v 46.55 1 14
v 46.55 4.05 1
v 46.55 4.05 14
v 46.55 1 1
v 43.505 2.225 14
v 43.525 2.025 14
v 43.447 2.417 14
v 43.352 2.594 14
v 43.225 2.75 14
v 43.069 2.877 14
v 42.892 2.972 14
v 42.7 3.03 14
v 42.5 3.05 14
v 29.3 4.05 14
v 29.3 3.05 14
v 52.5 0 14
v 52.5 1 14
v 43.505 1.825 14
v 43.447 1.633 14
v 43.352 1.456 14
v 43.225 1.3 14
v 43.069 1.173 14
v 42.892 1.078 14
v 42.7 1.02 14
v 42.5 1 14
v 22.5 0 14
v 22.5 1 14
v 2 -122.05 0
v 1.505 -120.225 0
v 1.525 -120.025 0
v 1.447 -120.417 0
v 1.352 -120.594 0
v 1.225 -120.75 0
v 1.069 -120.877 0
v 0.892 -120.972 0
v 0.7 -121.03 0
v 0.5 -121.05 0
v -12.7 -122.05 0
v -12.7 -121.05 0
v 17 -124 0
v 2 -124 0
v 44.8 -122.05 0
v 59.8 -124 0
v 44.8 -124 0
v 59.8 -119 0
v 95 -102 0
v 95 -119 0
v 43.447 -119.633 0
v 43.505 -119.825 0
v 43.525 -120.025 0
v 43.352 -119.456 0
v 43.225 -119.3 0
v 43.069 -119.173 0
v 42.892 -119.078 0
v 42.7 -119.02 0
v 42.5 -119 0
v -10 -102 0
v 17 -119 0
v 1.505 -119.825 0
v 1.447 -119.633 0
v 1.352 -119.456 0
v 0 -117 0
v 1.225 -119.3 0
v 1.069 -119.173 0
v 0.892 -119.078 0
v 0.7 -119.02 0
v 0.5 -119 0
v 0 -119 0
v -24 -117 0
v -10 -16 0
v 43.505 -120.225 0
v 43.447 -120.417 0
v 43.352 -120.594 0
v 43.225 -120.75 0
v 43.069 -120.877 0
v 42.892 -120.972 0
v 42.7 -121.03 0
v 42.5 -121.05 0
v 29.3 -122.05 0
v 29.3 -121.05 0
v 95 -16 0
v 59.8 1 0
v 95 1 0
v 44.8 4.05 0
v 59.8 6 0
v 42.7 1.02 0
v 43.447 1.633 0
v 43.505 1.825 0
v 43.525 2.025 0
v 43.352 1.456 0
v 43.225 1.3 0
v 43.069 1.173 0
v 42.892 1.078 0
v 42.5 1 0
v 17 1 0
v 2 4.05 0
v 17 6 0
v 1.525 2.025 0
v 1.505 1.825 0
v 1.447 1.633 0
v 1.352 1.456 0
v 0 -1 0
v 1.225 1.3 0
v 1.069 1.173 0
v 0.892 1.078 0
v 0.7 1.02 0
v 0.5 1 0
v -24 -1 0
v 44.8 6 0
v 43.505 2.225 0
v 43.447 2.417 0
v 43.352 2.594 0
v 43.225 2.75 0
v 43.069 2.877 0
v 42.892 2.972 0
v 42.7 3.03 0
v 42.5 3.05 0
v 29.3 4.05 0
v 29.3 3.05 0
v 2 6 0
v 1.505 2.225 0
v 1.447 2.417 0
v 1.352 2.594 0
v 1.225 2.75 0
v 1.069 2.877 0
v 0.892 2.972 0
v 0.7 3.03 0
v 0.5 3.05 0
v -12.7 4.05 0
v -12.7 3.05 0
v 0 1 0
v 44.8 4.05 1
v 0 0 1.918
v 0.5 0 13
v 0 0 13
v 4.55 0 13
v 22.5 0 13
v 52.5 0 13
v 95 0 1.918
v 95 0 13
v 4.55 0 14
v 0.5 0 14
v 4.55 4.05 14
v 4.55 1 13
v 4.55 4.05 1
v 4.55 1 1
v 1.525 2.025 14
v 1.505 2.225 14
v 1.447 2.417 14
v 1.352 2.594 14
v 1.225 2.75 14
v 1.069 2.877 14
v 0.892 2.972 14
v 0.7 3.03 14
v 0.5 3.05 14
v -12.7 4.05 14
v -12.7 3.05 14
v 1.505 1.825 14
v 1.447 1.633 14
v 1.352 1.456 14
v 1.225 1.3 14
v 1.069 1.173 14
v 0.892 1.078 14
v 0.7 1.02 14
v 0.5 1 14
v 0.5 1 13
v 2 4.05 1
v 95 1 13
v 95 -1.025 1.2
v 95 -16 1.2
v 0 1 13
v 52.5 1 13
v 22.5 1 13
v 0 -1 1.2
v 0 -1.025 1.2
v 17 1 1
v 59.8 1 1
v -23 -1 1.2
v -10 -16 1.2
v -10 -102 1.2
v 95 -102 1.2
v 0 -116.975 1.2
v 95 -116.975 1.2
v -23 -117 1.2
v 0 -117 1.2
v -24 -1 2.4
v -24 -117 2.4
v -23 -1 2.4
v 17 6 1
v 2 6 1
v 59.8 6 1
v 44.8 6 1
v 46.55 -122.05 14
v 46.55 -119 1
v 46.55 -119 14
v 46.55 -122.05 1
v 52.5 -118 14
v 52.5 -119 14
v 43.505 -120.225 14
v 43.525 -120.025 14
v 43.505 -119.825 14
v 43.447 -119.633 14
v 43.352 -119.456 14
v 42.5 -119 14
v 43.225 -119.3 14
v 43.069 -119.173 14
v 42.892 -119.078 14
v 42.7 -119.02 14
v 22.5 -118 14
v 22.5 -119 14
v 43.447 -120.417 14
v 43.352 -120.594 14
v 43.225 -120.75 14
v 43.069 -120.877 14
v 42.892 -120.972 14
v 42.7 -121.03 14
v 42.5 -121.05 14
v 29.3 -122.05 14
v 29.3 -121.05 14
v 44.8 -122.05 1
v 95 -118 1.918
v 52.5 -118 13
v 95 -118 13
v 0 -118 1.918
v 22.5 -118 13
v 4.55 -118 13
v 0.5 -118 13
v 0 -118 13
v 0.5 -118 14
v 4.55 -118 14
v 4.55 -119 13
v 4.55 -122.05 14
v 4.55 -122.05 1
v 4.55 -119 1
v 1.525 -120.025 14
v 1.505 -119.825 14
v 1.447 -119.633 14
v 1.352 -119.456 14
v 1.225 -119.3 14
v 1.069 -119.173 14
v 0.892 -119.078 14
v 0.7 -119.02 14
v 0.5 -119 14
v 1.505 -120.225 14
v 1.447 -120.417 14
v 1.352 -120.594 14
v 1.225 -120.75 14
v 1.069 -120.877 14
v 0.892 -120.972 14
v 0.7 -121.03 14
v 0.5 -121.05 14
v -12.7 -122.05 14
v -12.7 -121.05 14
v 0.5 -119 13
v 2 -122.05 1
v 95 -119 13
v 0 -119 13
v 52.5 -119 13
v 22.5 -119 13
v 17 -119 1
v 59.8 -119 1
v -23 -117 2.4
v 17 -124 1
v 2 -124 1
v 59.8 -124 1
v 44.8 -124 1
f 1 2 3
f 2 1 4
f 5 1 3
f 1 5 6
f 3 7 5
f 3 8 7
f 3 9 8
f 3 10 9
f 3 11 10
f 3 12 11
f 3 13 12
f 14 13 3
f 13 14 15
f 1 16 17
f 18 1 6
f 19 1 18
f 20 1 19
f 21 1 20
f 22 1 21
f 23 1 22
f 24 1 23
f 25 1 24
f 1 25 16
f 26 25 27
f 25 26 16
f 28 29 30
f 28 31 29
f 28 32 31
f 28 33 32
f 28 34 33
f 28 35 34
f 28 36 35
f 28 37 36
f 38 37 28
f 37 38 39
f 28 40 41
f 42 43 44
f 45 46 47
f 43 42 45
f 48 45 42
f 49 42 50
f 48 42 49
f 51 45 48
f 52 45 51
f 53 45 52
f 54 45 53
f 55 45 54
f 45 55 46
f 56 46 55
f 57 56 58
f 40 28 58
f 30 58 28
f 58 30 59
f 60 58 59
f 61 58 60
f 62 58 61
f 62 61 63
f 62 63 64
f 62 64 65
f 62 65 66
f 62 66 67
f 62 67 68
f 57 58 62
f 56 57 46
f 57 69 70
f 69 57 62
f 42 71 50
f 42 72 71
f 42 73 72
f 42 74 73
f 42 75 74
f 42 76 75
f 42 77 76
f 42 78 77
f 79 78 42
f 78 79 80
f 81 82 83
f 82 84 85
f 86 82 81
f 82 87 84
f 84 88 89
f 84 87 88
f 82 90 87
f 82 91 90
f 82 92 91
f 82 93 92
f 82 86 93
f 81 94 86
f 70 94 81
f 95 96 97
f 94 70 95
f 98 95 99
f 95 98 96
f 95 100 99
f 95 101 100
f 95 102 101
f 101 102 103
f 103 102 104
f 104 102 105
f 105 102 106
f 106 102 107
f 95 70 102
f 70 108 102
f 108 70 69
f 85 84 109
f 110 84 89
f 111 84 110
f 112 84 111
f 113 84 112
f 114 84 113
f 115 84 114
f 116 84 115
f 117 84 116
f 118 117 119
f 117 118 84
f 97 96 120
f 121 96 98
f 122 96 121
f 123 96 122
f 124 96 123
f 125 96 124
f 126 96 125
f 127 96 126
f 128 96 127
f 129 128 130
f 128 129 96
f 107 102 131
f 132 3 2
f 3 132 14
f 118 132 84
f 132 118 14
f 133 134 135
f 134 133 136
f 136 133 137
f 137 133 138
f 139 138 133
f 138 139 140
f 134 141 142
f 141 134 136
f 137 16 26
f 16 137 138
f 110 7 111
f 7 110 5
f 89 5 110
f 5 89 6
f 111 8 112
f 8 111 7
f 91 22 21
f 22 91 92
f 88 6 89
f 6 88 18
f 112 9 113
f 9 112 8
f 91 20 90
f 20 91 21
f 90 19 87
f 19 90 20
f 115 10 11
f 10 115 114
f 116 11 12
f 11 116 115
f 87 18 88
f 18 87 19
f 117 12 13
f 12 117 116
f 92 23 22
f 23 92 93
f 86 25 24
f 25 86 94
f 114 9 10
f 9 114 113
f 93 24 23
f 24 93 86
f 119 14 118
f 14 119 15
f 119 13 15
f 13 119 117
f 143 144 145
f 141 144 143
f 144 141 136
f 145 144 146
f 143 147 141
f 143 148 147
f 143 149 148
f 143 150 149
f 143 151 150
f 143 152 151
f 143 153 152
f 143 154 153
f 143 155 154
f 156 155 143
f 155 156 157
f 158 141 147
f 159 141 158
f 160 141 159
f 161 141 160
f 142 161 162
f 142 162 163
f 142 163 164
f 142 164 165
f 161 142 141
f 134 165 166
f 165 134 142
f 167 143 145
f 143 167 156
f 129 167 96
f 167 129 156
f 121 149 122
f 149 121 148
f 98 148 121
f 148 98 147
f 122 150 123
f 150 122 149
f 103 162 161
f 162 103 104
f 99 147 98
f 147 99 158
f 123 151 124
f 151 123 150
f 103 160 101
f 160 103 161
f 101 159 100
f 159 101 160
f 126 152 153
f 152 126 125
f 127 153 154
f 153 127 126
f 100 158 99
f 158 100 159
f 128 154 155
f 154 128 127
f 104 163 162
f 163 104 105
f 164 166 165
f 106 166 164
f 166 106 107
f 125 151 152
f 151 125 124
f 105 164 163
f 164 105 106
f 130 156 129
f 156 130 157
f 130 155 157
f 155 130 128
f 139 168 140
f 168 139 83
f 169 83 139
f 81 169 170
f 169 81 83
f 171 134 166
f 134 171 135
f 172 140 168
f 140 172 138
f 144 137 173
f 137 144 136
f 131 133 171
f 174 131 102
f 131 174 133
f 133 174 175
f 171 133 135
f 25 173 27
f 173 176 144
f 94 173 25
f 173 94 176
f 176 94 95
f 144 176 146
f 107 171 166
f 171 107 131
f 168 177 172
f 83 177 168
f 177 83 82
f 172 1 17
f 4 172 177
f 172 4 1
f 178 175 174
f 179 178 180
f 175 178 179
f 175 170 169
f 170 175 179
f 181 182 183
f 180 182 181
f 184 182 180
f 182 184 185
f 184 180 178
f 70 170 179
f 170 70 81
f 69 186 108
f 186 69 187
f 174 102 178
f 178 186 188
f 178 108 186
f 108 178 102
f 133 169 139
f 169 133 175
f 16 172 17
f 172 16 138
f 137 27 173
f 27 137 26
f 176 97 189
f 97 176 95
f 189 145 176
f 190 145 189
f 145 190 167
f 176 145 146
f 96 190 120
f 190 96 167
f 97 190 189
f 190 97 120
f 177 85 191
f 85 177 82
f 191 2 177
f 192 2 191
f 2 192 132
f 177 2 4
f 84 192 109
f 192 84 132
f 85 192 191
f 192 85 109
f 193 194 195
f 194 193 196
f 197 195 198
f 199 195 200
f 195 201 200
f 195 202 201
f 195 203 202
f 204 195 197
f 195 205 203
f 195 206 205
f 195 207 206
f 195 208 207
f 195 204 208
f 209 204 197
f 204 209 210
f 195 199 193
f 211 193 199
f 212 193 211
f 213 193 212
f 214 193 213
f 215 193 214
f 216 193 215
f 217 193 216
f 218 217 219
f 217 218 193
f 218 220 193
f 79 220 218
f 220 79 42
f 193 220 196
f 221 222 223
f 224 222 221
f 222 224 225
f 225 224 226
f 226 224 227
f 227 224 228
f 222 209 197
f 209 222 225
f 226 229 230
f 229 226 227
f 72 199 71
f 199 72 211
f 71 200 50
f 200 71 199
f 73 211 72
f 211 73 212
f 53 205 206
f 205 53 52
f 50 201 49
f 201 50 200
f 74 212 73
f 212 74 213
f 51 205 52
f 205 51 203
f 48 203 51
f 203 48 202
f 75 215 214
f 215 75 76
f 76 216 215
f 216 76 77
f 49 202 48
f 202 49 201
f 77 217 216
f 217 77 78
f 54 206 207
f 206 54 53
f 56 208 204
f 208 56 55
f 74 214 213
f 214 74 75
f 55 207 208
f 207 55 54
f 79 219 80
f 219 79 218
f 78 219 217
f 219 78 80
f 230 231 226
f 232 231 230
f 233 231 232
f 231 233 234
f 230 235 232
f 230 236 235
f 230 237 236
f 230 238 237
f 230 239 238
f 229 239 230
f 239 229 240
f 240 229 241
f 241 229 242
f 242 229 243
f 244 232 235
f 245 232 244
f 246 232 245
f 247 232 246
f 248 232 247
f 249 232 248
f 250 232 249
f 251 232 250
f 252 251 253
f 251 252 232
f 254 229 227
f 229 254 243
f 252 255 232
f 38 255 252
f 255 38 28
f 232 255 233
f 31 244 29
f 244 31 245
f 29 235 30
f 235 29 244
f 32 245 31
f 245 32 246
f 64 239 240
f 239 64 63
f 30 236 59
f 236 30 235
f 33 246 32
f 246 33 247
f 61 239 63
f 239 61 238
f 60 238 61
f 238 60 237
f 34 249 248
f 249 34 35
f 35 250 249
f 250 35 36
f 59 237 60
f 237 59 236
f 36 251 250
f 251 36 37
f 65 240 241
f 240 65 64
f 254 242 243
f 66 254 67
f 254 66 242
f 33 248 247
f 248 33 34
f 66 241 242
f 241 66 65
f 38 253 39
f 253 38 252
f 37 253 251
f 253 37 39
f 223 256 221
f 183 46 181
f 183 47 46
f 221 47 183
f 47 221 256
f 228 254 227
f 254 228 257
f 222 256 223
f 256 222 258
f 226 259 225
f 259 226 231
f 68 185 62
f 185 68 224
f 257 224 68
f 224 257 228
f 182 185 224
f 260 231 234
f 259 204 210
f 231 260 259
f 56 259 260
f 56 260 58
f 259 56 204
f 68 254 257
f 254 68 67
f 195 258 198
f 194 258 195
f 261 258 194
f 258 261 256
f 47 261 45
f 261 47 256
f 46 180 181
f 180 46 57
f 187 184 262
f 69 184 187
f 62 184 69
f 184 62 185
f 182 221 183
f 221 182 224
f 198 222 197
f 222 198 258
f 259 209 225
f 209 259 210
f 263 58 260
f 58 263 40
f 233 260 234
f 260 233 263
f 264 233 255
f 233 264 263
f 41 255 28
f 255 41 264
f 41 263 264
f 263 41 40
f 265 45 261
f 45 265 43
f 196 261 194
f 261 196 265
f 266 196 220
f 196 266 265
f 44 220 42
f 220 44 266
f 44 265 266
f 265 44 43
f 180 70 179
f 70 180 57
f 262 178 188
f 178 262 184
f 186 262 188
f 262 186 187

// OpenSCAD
  

restde=16;
backde=14;
backiw=118;//back inner width
backxtraraillen=24; // xtra rail length to go to back
restth=1.2;
endnar=1; //mm narrowing in the back area

module rackhook(){
  raillen=75;
  xtraraillen=20;
  railh=13;
  railth=1;


  pegw=11;
  pegth=1.95;//1.8
  flapw=30;
  flaph=14;
  flapth=1;
  hookth=1;
  hookw=pegw*1.2;
  hookgap=pegth+0.1;
  spineth=flapth+hookgap+hookth;
  xofs=-10;


	//rail
	cube([raillen+xtraraillen,railth,railh]);
  //extrarail front
	//rest
	translate([0,-restde,0]) cube([raillen+xtraraillen,restde,restth]);
	translate([-backxtraraillen,-restde,0]) cube([backxtraraillen,restde-endnar,restth]);
  //restchamfer
  translate([0,-0.3,1.25]) rotate([0,90,0]) rotate([0,0,275]) cylinder(d=1.5,h=raillen+xtraraillen,$fn=3);
  //outer plate
  translate([(raillen/2-flapw/2),0,0]) cube([flapw,flapth,flaph]);
  //hook
  union(){
	  translate([(raillen/2-flapw/2)+flapw-hookw+xofs,flapth+hookgap,0]) cube([hookw,flapth,flaph]);
	  difference(){
		   union(){		
			  //spine of hook 
			  translate([(raillen/2+flapw/2)+xofs,0,0]) cube([spineth,spineth,flaph]);
		   }//union
		 //rounder of spine
		 translate([(raillen/2+flapw/2)+xofs,railth+hookgap/2,-0.05]) cylinder(d=hookgap,h=flaph+0.1,$fn=32);
	  }//difference
	  //end hook
	}

 //hook2
 translate([-42,0,])  union(){
	  translate([(raillen/2-flapw/2)+flapw-hookw+xofs,flapth+hookgap,0]) cube([hookw,flapth,flaph]);
	  difference(){
		   union(){		
			  //spine of hook 
			  translate([(raillen/2+flapw/2)+xofs,0,0]) cube([spineth,spineth,flaph]);
		   }//union
		 //rounder of spine
		 translate([(raillen/2+flapw/2)+xofs,railth+hookgap/2,-0.05]) cylinder(d=hookgap,h=flaph+0.1,$fn=32);
	  }//difference
	  //end hook
	}

  //inflaps 
  flapofs1=2;  
  flapofs2=hookw+2;
  flaplen=raillen*0.2;
  flapde=5;//restde*0.4;
	translate([flapofs1,railth,0]) cube([flaplen,flapde,railth]);
	translate([raillen-flapofs2-flaplen,railth,0]) cube([flaplen,flapde,railth]);

//chamfered_cube([flaplen,flapde,railth],d=0.1);
//cube([flaplen,flapde,railth]);
}

union(){
	//hooks
		rackhook();
	translate([0,-backiw,0]) mirror ([0,1,0]) 
		rackhook();
	//backrail
	translate([-backxtraraillen,-backiw+restde,0]) cube([backde,backiw-restde*2,restth]);
	translate([-backxtraraillen,-backiw+endnar,0]) cube([1,backiw-endnar*2,restth*2]);
}
